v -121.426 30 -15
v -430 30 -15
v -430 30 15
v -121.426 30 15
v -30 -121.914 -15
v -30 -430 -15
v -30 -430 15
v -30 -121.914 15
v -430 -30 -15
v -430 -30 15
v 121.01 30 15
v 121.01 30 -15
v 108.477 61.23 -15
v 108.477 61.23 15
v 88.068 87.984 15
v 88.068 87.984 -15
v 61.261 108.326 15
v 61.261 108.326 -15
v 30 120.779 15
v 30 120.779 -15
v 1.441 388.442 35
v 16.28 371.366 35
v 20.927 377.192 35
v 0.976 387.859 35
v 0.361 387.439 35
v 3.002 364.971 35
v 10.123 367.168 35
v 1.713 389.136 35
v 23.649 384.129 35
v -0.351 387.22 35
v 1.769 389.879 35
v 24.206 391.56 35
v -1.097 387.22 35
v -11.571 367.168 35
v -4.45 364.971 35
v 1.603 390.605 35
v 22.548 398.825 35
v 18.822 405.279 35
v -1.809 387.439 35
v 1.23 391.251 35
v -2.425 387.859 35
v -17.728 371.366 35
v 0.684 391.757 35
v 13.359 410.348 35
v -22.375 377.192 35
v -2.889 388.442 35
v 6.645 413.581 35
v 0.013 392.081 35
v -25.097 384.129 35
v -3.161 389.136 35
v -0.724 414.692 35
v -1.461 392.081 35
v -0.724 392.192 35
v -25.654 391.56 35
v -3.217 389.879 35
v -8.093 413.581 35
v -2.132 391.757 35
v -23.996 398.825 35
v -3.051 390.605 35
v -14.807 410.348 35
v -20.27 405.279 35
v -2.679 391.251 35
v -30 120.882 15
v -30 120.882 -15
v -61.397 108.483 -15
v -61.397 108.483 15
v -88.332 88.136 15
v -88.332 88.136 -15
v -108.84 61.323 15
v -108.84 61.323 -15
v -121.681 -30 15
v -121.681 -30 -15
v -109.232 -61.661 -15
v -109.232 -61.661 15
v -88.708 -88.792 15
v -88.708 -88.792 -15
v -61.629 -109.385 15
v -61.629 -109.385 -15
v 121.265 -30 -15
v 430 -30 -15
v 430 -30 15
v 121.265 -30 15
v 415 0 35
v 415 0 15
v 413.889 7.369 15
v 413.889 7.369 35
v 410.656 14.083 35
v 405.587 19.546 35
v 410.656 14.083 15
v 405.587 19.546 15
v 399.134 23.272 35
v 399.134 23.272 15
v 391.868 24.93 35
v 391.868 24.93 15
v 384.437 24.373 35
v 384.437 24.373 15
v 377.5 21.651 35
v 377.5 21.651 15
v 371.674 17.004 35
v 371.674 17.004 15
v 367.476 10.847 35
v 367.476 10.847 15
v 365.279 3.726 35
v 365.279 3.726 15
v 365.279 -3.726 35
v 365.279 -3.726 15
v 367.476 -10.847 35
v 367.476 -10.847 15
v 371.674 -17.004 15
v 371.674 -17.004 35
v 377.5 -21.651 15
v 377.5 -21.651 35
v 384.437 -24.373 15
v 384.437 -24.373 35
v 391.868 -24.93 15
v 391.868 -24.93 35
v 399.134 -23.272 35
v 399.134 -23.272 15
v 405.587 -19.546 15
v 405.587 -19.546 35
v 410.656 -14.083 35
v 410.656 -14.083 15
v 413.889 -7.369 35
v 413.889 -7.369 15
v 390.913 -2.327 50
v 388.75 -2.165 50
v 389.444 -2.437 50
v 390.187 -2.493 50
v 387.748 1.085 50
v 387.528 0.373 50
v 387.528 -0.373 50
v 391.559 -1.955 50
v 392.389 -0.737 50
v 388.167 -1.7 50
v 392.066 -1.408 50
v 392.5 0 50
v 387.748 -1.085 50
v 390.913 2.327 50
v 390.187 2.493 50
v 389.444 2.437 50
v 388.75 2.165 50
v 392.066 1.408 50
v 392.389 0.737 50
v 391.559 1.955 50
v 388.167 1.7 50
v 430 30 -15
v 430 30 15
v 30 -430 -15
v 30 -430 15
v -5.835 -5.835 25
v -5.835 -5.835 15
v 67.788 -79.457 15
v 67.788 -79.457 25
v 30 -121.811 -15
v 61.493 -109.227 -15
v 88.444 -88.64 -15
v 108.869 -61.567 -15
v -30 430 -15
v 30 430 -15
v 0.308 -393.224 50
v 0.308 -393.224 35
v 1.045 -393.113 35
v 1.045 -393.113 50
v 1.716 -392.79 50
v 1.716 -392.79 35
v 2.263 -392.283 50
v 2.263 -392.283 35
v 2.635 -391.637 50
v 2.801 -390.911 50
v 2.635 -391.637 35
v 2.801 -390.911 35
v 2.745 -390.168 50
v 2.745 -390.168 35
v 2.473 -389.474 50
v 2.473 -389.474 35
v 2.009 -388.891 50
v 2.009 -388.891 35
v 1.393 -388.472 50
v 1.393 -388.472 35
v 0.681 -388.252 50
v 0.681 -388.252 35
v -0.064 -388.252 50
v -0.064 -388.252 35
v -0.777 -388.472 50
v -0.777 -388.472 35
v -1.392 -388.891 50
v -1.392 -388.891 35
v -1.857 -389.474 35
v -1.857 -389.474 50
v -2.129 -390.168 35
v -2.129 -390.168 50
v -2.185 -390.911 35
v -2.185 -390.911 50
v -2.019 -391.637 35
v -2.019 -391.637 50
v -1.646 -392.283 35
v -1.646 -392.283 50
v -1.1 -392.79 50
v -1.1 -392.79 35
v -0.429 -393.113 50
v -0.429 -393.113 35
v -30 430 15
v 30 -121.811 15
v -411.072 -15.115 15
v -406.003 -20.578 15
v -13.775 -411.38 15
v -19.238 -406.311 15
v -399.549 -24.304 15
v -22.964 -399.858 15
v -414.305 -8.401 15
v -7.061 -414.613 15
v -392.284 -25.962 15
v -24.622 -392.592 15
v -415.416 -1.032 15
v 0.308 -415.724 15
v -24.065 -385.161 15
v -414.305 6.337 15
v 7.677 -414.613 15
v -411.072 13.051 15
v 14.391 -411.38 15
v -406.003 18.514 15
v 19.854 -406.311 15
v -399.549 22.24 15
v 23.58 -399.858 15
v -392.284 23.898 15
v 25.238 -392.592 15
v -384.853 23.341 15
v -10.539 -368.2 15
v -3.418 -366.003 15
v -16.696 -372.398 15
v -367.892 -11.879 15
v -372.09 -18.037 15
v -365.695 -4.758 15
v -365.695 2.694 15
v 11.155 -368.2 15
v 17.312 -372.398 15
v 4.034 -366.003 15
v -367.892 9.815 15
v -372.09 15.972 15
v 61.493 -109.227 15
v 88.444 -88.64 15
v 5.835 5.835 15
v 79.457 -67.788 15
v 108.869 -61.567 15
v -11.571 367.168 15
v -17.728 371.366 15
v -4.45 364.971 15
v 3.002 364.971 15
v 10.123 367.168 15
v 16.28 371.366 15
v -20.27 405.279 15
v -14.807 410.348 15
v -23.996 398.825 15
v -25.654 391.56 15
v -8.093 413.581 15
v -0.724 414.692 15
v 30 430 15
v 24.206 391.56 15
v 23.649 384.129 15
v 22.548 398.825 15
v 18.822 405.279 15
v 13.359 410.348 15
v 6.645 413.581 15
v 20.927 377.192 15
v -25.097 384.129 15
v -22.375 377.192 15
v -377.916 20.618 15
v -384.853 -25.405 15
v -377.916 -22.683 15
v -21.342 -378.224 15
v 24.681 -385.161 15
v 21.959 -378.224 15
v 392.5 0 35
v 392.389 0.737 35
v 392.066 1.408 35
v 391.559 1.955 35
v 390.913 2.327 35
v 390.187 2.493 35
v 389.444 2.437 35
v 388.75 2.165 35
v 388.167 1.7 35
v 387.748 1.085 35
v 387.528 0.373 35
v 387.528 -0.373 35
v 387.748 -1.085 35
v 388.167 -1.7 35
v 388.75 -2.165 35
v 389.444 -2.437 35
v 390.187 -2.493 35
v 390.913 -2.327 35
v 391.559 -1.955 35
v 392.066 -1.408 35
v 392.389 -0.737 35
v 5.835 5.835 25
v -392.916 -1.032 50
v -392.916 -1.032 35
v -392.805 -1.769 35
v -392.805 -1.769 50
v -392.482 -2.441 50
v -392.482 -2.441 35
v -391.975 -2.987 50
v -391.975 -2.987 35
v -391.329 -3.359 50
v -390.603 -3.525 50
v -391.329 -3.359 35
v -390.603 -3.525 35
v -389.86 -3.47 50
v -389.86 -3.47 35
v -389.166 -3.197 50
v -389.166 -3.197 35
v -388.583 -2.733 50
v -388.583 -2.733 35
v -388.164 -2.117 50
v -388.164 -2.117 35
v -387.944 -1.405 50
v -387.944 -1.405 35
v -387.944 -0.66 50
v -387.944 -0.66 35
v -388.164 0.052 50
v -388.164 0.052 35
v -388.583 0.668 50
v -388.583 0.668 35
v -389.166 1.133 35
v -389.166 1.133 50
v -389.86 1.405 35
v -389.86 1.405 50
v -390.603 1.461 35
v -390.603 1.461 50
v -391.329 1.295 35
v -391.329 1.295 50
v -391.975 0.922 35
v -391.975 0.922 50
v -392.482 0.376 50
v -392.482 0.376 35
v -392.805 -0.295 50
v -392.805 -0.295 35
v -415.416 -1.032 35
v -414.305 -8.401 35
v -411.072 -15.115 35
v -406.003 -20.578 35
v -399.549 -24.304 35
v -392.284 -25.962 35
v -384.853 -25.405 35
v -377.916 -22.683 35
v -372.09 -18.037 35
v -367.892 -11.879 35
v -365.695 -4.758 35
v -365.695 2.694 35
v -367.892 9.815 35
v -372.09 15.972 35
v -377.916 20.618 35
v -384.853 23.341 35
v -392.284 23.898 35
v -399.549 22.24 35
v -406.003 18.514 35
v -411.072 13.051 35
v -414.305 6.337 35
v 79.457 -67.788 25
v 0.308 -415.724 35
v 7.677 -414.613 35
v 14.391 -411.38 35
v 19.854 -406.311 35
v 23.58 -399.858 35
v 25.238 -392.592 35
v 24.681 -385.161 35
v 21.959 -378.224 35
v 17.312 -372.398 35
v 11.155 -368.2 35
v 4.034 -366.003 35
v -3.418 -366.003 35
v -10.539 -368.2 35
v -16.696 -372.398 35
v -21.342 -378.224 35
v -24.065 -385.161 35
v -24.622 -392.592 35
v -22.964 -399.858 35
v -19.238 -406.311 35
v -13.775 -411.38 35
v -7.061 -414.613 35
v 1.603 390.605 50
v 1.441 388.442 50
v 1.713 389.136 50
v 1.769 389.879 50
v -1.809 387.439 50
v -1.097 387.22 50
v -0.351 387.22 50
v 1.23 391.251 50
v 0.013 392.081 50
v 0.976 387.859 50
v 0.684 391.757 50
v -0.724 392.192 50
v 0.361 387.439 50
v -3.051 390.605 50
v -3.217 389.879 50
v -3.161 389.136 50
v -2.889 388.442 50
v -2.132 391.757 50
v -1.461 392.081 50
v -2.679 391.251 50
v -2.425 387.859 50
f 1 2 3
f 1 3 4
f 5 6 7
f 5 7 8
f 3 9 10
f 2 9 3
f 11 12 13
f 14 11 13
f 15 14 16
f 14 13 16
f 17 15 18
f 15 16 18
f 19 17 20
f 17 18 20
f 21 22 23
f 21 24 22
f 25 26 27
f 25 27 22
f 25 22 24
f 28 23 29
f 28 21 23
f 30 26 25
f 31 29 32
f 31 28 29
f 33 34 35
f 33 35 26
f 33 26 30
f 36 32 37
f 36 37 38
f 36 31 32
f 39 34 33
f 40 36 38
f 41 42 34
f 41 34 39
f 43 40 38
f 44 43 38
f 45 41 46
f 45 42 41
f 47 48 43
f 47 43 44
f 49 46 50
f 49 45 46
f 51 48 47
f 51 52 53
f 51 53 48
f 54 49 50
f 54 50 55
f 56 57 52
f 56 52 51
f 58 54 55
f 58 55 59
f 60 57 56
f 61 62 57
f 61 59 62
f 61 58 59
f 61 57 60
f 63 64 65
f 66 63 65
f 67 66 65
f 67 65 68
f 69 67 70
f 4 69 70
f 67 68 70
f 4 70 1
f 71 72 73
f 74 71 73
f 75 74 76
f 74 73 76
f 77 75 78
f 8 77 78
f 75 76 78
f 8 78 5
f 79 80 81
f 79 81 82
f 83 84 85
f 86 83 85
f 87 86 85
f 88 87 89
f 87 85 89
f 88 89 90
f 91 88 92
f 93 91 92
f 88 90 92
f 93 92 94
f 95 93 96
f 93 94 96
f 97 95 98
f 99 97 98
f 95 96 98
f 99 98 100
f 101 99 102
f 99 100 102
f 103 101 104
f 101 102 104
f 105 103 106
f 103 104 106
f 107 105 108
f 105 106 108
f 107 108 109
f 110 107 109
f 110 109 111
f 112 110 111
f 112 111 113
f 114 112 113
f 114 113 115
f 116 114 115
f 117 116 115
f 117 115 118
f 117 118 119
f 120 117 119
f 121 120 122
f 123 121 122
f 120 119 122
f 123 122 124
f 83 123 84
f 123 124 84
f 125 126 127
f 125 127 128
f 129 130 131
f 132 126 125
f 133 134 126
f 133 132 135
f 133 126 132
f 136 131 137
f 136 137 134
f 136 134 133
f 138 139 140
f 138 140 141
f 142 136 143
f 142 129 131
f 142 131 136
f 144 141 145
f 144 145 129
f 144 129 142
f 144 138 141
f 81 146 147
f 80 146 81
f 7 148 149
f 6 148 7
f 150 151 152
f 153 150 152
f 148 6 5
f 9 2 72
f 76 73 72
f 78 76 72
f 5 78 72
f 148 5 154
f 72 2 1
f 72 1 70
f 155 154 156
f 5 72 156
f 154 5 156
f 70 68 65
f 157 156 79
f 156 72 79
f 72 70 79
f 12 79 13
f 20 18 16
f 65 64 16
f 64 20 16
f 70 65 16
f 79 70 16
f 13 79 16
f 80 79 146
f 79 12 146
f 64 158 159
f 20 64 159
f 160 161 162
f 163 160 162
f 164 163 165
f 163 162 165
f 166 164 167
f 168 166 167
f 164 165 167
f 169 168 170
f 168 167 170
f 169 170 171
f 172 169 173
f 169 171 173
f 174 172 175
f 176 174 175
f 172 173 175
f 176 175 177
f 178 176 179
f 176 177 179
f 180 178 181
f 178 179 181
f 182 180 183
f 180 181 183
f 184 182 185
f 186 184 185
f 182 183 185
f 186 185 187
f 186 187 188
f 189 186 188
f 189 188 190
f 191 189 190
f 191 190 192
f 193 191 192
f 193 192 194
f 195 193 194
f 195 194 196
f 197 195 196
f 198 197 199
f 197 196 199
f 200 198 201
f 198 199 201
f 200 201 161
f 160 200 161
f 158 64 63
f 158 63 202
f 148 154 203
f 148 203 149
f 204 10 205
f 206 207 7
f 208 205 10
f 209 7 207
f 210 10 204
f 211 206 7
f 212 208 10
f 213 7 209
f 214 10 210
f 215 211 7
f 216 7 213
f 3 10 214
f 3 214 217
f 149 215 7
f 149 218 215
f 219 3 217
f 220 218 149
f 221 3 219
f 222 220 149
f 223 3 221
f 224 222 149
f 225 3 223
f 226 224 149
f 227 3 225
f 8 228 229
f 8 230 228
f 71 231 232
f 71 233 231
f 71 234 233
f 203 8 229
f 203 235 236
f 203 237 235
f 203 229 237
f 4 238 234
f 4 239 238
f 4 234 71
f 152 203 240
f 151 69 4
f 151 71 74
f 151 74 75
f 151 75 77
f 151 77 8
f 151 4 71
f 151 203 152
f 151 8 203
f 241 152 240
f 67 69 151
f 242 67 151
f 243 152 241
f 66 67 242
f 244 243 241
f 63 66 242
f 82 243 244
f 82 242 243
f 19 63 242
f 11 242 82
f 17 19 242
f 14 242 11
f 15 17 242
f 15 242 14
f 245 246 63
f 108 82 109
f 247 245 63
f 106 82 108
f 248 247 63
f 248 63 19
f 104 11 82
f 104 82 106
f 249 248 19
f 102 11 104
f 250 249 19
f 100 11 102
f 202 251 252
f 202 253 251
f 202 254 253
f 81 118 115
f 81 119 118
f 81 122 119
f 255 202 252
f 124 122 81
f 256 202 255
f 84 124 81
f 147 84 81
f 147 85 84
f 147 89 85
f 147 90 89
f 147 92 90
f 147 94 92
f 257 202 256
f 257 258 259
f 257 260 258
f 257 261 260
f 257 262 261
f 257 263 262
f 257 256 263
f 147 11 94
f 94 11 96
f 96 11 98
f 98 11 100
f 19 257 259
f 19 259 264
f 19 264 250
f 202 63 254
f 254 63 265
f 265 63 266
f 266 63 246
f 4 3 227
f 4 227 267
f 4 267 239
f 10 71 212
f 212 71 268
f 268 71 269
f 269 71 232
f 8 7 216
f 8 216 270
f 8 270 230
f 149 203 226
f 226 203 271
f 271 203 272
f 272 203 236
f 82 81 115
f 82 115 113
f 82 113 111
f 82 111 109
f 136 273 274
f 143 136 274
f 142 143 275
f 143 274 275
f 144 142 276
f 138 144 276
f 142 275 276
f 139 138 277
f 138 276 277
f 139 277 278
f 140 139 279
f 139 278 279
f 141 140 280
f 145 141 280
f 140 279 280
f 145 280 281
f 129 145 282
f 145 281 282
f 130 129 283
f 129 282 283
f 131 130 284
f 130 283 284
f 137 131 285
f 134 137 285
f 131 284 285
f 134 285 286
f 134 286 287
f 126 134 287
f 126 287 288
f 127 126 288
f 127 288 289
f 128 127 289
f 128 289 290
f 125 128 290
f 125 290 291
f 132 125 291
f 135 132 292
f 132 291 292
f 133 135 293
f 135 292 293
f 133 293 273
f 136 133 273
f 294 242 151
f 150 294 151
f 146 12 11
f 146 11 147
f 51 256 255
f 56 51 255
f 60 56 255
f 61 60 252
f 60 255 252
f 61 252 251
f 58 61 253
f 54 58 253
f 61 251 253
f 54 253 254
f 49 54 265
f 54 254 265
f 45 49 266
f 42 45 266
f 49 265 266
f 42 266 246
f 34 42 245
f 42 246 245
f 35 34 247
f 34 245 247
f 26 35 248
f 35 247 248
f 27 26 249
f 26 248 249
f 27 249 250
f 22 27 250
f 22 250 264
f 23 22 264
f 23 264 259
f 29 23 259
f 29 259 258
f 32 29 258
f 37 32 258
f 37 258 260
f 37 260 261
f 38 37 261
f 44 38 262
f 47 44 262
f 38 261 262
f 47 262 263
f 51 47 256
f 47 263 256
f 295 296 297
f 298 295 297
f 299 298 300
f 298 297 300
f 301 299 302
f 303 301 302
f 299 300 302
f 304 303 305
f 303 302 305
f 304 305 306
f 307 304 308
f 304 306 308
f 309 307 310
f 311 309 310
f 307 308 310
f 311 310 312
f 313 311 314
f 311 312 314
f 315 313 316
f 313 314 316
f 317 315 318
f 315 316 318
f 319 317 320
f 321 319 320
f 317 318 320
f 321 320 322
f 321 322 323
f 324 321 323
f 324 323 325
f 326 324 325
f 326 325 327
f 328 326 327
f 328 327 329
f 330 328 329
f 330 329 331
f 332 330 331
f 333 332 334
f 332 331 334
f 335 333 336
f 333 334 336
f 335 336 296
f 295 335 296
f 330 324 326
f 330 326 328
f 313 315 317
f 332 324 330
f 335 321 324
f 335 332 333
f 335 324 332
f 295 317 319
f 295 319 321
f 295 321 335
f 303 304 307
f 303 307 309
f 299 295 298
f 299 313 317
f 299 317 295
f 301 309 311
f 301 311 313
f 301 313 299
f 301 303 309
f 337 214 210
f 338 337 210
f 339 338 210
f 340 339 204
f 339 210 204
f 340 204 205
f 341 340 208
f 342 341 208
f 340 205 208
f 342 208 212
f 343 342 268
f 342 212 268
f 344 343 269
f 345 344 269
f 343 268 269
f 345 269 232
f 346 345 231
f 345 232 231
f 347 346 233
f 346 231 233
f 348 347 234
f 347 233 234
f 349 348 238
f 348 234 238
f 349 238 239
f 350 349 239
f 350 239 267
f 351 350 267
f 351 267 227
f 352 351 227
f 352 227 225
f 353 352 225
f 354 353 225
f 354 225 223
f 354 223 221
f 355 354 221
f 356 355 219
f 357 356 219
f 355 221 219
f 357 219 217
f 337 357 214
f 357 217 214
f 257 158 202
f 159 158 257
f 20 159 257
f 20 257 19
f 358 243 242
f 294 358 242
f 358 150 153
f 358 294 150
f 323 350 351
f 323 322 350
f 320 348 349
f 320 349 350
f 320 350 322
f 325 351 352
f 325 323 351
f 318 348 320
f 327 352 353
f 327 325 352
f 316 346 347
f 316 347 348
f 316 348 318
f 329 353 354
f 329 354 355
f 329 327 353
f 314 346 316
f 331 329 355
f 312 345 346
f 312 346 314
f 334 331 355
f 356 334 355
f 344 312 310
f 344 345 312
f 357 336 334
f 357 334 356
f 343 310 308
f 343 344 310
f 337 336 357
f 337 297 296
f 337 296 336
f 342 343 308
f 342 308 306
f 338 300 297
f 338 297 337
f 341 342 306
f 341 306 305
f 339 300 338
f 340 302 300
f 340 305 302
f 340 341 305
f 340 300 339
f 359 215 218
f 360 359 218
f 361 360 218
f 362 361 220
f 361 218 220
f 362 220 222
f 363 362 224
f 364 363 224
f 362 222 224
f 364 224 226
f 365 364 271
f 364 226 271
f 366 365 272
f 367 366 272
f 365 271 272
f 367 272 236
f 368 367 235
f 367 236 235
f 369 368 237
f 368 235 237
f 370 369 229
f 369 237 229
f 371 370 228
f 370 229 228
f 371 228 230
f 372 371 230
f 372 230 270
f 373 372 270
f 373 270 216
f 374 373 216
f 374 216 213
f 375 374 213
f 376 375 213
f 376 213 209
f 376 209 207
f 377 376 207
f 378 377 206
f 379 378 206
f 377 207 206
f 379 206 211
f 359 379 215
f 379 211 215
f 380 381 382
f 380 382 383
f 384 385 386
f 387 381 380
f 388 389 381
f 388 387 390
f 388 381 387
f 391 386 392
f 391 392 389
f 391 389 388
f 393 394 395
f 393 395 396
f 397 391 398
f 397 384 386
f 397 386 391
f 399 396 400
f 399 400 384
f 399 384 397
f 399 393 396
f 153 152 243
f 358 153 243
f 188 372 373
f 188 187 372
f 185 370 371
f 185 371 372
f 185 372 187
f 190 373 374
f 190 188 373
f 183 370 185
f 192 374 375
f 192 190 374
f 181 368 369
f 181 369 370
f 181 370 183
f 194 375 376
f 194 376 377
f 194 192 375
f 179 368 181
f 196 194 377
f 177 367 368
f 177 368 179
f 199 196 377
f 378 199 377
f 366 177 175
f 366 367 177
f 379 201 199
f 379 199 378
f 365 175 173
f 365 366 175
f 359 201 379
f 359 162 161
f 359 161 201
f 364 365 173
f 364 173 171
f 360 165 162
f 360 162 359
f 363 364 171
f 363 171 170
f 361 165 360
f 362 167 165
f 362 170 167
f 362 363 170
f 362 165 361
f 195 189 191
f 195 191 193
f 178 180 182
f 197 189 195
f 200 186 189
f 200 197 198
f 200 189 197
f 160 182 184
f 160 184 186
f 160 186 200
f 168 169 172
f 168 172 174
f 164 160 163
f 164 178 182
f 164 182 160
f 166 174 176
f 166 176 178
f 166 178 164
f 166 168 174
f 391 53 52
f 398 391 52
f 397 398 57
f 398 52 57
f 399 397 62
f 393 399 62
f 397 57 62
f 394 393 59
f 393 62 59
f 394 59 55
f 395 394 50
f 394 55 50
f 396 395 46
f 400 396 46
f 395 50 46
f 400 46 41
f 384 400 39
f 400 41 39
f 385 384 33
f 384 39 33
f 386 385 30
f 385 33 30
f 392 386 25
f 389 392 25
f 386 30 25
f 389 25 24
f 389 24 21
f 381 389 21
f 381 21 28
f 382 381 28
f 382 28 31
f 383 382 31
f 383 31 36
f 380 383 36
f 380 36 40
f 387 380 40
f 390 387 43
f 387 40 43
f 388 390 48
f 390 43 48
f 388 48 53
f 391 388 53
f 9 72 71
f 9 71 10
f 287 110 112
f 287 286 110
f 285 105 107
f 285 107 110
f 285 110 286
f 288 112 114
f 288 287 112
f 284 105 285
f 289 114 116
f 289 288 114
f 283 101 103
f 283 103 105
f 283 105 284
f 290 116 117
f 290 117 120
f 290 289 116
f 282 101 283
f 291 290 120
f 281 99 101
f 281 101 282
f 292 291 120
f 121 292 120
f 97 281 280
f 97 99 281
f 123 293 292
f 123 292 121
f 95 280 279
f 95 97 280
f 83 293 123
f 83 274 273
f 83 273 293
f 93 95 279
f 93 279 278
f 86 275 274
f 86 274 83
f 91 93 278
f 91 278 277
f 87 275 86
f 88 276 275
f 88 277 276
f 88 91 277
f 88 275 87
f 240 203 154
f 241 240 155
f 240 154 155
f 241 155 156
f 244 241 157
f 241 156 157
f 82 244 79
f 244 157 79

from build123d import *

# Parameters (mm, degrees)
BOSS_EXTRUDE1_DEPTH      = 15
BOSS_EXTRUDE1_DEPTH_BACK = 15
SKETCH2_R                = 25
BOSS_EXTRUDE2_DEPTH      = 20
SKETCH3_R                = 2.5
BOSS_EXTRUDE3_DEPTH      = 15
CIRPATTERN1_COUNT        = 4
BOSS_EXTRUDE4_DEPTH      = 10


with BuildPart() as part:
    # Sketch1 → Boss-Extrude1 (new, two sides: drawn at the far end of the back side and taken through both)
    with BuildSketch(Plane.XY.offset(-BOSS_EXTRUDE1_DEPTH_BACK)):
        with BuildLine():
            Line((30, 430), (-30, 430))
            Line((-30, 430), (-30, 120.881719036))
            ThreePointArc((-30, 120.881719036), (-88.332125518, 88.135628612), (-121.425810587, 30))
            Line((-121.425810587, 30), (-430, 30))
            Line((-430, 30), (-430, -30))
            Line((-430, -30), (-121.68100765, -30))
            ThreePointArc((-121.68100765, -30), (-88.7083861, -88.792246397), (-30, -121.91395242))
            Line((-30, -121.91395242), (-30, -430))
            Line((-30, -430), (30, -430))
            Line((30, -430), (30, -121.811124765))
            ThreePointArc((30, -121.811124765), (88.443617434, -88.640445466), (121.26508205, -30))
            Line((121.26508205, -30), (430, -30))
            Line((430, -30), (430, 30))
            Line((430, 30), (121.009884987, 30))
            ThreePointArc((121.009884987, 30), (88.068001132, 87.984471961), (30, 120.778891382))
            Line((30, 120.778891382), (30, 430))
        make_face()
    extrude(amount=BOSS_EXTRUDE1_DEPTH + BOSS_EXTRUDE1_DEPTH_BACK)

    # Sketch2 → Boss-Extrude2 (add)
    with BuildSketch(Plane.XY.offset(15)):
        with Locations((390, 0)):
            Circle(SKETCH2_R)
    boss_extrude2 = extrude(amount=BOSS_EXTRUDE2_DEPTH)

    # Sketch3 → Boss-Extrude3 (add)
    with BuildSketch(Plane.XY.offset(35)):
        with Locations((390, 0)):
            Circle(SKETCH3_R)
    boss_extrude3 = extrude(amount=BOSS_EXTRUDE3_DEPTH)

    # CirPattern1: Boss-Extrude2, Boss-Extrude3 ×4 about axis
    cirpattern1_axis = Axis((-0.2079628, -0.516116692, -15), (0, 0, 1))
    add([boss_extrude2.rotate(cirpattern1_axis, i * 360 / CIRPATTERN1_COUNT) for i in range(1, CIRPATTERN1_COUNT)])
    add([boss_extrude3.rotate(cirpattern1_axis, i * 360 / CIRPATTERN1_COUNT) for i in range(1, CIRPATTERN1_COUNT)])

    # Sketch4 → Boss-Extrude4 (add)
    with BuildSketch(Plane.XY.offset(15)):
        Polygon((-5.834664758, -5.834664758), (67.788123176, -79.457452693), (79.457452693, -67.788123176), (5.834664758, 5.834664758), align=None)
    extrude(amount=BOSS_EXTRUDE4_DEPTH)


solid = part.part
